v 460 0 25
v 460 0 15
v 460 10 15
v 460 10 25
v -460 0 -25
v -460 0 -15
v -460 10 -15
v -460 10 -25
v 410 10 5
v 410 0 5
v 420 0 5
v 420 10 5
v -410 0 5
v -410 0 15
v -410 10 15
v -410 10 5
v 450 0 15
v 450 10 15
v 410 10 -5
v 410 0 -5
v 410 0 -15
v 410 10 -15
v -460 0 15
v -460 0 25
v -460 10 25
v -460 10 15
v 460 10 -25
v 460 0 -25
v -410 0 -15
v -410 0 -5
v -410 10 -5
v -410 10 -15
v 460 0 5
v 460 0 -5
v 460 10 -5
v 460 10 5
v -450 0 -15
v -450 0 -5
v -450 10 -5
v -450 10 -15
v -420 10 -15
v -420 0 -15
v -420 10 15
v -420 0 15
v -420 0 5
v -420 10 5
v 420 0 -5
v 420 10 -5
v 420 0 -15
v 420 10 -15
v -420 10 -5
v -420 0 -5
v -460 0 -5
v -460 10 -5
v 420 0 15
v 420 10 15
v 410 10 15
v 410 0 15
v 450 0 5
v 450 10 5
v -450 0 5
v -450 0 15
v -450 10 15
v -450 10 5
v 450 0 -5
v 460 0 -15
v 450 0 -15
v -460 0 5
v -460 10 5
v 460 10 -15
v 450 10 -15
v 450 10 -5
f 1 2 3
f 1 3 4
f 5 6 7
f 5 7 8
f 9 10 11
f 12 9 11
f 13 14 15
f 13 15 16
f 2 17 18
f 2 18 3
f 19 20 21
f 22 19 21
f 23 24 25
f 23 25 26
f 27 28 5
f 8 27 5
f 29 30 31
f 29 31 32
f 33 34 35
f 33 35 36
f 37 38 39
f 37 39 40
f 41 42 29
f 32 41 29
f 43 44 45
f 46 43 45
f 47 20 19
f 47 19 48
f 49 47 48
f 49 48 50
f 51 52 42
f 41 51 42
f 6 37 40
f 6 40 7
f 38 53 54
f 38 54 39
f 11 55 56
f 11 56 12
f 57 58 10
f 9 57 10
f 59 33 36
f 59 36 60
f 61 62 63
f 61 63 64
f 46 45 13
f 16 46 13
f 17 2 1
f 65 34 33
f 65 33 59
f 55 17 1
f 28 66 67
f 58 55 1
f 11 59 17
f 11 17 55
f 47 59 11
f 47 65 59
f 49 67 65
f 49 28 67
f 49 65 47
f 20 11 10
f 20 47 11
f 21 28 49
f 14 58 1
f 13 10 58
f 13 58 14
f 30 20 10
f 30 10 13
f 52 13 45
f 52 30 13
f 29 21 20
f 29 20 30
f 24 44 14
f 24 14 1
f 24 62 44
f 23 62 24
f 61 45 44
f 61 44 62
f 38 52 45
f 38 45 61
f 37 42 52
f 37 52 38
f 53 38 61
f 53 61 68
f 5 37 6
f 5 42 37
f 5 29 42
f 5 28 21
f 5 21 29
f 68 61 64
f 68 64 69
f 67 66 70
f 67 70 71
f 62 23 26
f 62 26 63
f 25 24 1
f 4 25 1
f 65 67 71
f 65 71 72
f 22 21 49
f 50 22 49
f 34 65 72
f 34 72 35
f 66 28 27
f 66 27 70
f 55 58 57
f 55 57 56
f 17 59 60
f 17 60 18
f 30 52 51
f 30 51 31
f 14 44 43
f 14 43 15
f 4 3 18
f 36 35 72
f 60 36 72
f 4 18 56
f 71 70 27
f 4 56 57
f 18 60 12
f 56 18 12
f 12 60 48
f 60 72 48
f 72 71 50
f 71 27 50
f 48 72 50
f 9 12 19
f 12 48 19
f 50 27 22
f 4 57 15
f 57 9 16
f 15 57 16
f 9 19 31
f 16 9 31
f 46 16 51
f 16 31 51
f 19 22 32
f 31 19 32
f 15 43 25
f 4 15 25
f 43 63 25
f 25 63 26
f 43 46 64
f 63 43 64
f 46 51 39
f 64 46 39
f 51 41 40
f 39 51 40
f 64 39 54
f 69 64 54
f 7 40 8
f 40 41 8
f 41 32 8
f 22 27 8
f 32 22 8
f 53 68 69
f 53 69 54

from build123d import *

# Parameters (mm, degrees)
SKETCH_1_W      = 10
SKETCH_1_H      = 10
EXTRUDE_1_DEPTH = 10


with BuildPart() as part:
    # Эскиз1 → Бобышка-Вытянуть1 (new body)
    with BuildSketch(Plane(origin=(0, 0, 0), x_dir=(1, 0, 0), z_dir=(0, 1, 0))):
        Polygon((-450, 5), (-450, 15), (-460, 15), (-460, 25), (-450, 25), (450, 25), (460, 25), (460, 15), (450, 15), (450, 5), (460, 5), (460, -5), (450, -5), (450, -15), (460, -15), (460, -25), (450, -25), (-450, -25), (-460, -25), (-460, -15), (-450, -15), (-450, -5), (-460, -5), (-460, 5), align=None)
        with Locations((-415, -10)):
            Rectangle(SKETCH_1_W, SKETCH_1_H, mode=Mode.SUBTRACT)
        with Locations((-415, 10)):
            Rectangle(SKETCH_1_W, SKETCH_1_H, mode=Mode.SUBTRACT)
        with Locations((415, 10)):
            Rectangle(SKETCH_1_W, SKETCH_1_H, mode=Mode.SUBTRACT)
        with Locations((415, -10)):
            Rectangle(SKETCH_1_W, SKETCH_1_H, mode=Mode.SUBTRACT)
    extrude(amount=EXTRUDE_1_DEPTH)


solid = part.part
